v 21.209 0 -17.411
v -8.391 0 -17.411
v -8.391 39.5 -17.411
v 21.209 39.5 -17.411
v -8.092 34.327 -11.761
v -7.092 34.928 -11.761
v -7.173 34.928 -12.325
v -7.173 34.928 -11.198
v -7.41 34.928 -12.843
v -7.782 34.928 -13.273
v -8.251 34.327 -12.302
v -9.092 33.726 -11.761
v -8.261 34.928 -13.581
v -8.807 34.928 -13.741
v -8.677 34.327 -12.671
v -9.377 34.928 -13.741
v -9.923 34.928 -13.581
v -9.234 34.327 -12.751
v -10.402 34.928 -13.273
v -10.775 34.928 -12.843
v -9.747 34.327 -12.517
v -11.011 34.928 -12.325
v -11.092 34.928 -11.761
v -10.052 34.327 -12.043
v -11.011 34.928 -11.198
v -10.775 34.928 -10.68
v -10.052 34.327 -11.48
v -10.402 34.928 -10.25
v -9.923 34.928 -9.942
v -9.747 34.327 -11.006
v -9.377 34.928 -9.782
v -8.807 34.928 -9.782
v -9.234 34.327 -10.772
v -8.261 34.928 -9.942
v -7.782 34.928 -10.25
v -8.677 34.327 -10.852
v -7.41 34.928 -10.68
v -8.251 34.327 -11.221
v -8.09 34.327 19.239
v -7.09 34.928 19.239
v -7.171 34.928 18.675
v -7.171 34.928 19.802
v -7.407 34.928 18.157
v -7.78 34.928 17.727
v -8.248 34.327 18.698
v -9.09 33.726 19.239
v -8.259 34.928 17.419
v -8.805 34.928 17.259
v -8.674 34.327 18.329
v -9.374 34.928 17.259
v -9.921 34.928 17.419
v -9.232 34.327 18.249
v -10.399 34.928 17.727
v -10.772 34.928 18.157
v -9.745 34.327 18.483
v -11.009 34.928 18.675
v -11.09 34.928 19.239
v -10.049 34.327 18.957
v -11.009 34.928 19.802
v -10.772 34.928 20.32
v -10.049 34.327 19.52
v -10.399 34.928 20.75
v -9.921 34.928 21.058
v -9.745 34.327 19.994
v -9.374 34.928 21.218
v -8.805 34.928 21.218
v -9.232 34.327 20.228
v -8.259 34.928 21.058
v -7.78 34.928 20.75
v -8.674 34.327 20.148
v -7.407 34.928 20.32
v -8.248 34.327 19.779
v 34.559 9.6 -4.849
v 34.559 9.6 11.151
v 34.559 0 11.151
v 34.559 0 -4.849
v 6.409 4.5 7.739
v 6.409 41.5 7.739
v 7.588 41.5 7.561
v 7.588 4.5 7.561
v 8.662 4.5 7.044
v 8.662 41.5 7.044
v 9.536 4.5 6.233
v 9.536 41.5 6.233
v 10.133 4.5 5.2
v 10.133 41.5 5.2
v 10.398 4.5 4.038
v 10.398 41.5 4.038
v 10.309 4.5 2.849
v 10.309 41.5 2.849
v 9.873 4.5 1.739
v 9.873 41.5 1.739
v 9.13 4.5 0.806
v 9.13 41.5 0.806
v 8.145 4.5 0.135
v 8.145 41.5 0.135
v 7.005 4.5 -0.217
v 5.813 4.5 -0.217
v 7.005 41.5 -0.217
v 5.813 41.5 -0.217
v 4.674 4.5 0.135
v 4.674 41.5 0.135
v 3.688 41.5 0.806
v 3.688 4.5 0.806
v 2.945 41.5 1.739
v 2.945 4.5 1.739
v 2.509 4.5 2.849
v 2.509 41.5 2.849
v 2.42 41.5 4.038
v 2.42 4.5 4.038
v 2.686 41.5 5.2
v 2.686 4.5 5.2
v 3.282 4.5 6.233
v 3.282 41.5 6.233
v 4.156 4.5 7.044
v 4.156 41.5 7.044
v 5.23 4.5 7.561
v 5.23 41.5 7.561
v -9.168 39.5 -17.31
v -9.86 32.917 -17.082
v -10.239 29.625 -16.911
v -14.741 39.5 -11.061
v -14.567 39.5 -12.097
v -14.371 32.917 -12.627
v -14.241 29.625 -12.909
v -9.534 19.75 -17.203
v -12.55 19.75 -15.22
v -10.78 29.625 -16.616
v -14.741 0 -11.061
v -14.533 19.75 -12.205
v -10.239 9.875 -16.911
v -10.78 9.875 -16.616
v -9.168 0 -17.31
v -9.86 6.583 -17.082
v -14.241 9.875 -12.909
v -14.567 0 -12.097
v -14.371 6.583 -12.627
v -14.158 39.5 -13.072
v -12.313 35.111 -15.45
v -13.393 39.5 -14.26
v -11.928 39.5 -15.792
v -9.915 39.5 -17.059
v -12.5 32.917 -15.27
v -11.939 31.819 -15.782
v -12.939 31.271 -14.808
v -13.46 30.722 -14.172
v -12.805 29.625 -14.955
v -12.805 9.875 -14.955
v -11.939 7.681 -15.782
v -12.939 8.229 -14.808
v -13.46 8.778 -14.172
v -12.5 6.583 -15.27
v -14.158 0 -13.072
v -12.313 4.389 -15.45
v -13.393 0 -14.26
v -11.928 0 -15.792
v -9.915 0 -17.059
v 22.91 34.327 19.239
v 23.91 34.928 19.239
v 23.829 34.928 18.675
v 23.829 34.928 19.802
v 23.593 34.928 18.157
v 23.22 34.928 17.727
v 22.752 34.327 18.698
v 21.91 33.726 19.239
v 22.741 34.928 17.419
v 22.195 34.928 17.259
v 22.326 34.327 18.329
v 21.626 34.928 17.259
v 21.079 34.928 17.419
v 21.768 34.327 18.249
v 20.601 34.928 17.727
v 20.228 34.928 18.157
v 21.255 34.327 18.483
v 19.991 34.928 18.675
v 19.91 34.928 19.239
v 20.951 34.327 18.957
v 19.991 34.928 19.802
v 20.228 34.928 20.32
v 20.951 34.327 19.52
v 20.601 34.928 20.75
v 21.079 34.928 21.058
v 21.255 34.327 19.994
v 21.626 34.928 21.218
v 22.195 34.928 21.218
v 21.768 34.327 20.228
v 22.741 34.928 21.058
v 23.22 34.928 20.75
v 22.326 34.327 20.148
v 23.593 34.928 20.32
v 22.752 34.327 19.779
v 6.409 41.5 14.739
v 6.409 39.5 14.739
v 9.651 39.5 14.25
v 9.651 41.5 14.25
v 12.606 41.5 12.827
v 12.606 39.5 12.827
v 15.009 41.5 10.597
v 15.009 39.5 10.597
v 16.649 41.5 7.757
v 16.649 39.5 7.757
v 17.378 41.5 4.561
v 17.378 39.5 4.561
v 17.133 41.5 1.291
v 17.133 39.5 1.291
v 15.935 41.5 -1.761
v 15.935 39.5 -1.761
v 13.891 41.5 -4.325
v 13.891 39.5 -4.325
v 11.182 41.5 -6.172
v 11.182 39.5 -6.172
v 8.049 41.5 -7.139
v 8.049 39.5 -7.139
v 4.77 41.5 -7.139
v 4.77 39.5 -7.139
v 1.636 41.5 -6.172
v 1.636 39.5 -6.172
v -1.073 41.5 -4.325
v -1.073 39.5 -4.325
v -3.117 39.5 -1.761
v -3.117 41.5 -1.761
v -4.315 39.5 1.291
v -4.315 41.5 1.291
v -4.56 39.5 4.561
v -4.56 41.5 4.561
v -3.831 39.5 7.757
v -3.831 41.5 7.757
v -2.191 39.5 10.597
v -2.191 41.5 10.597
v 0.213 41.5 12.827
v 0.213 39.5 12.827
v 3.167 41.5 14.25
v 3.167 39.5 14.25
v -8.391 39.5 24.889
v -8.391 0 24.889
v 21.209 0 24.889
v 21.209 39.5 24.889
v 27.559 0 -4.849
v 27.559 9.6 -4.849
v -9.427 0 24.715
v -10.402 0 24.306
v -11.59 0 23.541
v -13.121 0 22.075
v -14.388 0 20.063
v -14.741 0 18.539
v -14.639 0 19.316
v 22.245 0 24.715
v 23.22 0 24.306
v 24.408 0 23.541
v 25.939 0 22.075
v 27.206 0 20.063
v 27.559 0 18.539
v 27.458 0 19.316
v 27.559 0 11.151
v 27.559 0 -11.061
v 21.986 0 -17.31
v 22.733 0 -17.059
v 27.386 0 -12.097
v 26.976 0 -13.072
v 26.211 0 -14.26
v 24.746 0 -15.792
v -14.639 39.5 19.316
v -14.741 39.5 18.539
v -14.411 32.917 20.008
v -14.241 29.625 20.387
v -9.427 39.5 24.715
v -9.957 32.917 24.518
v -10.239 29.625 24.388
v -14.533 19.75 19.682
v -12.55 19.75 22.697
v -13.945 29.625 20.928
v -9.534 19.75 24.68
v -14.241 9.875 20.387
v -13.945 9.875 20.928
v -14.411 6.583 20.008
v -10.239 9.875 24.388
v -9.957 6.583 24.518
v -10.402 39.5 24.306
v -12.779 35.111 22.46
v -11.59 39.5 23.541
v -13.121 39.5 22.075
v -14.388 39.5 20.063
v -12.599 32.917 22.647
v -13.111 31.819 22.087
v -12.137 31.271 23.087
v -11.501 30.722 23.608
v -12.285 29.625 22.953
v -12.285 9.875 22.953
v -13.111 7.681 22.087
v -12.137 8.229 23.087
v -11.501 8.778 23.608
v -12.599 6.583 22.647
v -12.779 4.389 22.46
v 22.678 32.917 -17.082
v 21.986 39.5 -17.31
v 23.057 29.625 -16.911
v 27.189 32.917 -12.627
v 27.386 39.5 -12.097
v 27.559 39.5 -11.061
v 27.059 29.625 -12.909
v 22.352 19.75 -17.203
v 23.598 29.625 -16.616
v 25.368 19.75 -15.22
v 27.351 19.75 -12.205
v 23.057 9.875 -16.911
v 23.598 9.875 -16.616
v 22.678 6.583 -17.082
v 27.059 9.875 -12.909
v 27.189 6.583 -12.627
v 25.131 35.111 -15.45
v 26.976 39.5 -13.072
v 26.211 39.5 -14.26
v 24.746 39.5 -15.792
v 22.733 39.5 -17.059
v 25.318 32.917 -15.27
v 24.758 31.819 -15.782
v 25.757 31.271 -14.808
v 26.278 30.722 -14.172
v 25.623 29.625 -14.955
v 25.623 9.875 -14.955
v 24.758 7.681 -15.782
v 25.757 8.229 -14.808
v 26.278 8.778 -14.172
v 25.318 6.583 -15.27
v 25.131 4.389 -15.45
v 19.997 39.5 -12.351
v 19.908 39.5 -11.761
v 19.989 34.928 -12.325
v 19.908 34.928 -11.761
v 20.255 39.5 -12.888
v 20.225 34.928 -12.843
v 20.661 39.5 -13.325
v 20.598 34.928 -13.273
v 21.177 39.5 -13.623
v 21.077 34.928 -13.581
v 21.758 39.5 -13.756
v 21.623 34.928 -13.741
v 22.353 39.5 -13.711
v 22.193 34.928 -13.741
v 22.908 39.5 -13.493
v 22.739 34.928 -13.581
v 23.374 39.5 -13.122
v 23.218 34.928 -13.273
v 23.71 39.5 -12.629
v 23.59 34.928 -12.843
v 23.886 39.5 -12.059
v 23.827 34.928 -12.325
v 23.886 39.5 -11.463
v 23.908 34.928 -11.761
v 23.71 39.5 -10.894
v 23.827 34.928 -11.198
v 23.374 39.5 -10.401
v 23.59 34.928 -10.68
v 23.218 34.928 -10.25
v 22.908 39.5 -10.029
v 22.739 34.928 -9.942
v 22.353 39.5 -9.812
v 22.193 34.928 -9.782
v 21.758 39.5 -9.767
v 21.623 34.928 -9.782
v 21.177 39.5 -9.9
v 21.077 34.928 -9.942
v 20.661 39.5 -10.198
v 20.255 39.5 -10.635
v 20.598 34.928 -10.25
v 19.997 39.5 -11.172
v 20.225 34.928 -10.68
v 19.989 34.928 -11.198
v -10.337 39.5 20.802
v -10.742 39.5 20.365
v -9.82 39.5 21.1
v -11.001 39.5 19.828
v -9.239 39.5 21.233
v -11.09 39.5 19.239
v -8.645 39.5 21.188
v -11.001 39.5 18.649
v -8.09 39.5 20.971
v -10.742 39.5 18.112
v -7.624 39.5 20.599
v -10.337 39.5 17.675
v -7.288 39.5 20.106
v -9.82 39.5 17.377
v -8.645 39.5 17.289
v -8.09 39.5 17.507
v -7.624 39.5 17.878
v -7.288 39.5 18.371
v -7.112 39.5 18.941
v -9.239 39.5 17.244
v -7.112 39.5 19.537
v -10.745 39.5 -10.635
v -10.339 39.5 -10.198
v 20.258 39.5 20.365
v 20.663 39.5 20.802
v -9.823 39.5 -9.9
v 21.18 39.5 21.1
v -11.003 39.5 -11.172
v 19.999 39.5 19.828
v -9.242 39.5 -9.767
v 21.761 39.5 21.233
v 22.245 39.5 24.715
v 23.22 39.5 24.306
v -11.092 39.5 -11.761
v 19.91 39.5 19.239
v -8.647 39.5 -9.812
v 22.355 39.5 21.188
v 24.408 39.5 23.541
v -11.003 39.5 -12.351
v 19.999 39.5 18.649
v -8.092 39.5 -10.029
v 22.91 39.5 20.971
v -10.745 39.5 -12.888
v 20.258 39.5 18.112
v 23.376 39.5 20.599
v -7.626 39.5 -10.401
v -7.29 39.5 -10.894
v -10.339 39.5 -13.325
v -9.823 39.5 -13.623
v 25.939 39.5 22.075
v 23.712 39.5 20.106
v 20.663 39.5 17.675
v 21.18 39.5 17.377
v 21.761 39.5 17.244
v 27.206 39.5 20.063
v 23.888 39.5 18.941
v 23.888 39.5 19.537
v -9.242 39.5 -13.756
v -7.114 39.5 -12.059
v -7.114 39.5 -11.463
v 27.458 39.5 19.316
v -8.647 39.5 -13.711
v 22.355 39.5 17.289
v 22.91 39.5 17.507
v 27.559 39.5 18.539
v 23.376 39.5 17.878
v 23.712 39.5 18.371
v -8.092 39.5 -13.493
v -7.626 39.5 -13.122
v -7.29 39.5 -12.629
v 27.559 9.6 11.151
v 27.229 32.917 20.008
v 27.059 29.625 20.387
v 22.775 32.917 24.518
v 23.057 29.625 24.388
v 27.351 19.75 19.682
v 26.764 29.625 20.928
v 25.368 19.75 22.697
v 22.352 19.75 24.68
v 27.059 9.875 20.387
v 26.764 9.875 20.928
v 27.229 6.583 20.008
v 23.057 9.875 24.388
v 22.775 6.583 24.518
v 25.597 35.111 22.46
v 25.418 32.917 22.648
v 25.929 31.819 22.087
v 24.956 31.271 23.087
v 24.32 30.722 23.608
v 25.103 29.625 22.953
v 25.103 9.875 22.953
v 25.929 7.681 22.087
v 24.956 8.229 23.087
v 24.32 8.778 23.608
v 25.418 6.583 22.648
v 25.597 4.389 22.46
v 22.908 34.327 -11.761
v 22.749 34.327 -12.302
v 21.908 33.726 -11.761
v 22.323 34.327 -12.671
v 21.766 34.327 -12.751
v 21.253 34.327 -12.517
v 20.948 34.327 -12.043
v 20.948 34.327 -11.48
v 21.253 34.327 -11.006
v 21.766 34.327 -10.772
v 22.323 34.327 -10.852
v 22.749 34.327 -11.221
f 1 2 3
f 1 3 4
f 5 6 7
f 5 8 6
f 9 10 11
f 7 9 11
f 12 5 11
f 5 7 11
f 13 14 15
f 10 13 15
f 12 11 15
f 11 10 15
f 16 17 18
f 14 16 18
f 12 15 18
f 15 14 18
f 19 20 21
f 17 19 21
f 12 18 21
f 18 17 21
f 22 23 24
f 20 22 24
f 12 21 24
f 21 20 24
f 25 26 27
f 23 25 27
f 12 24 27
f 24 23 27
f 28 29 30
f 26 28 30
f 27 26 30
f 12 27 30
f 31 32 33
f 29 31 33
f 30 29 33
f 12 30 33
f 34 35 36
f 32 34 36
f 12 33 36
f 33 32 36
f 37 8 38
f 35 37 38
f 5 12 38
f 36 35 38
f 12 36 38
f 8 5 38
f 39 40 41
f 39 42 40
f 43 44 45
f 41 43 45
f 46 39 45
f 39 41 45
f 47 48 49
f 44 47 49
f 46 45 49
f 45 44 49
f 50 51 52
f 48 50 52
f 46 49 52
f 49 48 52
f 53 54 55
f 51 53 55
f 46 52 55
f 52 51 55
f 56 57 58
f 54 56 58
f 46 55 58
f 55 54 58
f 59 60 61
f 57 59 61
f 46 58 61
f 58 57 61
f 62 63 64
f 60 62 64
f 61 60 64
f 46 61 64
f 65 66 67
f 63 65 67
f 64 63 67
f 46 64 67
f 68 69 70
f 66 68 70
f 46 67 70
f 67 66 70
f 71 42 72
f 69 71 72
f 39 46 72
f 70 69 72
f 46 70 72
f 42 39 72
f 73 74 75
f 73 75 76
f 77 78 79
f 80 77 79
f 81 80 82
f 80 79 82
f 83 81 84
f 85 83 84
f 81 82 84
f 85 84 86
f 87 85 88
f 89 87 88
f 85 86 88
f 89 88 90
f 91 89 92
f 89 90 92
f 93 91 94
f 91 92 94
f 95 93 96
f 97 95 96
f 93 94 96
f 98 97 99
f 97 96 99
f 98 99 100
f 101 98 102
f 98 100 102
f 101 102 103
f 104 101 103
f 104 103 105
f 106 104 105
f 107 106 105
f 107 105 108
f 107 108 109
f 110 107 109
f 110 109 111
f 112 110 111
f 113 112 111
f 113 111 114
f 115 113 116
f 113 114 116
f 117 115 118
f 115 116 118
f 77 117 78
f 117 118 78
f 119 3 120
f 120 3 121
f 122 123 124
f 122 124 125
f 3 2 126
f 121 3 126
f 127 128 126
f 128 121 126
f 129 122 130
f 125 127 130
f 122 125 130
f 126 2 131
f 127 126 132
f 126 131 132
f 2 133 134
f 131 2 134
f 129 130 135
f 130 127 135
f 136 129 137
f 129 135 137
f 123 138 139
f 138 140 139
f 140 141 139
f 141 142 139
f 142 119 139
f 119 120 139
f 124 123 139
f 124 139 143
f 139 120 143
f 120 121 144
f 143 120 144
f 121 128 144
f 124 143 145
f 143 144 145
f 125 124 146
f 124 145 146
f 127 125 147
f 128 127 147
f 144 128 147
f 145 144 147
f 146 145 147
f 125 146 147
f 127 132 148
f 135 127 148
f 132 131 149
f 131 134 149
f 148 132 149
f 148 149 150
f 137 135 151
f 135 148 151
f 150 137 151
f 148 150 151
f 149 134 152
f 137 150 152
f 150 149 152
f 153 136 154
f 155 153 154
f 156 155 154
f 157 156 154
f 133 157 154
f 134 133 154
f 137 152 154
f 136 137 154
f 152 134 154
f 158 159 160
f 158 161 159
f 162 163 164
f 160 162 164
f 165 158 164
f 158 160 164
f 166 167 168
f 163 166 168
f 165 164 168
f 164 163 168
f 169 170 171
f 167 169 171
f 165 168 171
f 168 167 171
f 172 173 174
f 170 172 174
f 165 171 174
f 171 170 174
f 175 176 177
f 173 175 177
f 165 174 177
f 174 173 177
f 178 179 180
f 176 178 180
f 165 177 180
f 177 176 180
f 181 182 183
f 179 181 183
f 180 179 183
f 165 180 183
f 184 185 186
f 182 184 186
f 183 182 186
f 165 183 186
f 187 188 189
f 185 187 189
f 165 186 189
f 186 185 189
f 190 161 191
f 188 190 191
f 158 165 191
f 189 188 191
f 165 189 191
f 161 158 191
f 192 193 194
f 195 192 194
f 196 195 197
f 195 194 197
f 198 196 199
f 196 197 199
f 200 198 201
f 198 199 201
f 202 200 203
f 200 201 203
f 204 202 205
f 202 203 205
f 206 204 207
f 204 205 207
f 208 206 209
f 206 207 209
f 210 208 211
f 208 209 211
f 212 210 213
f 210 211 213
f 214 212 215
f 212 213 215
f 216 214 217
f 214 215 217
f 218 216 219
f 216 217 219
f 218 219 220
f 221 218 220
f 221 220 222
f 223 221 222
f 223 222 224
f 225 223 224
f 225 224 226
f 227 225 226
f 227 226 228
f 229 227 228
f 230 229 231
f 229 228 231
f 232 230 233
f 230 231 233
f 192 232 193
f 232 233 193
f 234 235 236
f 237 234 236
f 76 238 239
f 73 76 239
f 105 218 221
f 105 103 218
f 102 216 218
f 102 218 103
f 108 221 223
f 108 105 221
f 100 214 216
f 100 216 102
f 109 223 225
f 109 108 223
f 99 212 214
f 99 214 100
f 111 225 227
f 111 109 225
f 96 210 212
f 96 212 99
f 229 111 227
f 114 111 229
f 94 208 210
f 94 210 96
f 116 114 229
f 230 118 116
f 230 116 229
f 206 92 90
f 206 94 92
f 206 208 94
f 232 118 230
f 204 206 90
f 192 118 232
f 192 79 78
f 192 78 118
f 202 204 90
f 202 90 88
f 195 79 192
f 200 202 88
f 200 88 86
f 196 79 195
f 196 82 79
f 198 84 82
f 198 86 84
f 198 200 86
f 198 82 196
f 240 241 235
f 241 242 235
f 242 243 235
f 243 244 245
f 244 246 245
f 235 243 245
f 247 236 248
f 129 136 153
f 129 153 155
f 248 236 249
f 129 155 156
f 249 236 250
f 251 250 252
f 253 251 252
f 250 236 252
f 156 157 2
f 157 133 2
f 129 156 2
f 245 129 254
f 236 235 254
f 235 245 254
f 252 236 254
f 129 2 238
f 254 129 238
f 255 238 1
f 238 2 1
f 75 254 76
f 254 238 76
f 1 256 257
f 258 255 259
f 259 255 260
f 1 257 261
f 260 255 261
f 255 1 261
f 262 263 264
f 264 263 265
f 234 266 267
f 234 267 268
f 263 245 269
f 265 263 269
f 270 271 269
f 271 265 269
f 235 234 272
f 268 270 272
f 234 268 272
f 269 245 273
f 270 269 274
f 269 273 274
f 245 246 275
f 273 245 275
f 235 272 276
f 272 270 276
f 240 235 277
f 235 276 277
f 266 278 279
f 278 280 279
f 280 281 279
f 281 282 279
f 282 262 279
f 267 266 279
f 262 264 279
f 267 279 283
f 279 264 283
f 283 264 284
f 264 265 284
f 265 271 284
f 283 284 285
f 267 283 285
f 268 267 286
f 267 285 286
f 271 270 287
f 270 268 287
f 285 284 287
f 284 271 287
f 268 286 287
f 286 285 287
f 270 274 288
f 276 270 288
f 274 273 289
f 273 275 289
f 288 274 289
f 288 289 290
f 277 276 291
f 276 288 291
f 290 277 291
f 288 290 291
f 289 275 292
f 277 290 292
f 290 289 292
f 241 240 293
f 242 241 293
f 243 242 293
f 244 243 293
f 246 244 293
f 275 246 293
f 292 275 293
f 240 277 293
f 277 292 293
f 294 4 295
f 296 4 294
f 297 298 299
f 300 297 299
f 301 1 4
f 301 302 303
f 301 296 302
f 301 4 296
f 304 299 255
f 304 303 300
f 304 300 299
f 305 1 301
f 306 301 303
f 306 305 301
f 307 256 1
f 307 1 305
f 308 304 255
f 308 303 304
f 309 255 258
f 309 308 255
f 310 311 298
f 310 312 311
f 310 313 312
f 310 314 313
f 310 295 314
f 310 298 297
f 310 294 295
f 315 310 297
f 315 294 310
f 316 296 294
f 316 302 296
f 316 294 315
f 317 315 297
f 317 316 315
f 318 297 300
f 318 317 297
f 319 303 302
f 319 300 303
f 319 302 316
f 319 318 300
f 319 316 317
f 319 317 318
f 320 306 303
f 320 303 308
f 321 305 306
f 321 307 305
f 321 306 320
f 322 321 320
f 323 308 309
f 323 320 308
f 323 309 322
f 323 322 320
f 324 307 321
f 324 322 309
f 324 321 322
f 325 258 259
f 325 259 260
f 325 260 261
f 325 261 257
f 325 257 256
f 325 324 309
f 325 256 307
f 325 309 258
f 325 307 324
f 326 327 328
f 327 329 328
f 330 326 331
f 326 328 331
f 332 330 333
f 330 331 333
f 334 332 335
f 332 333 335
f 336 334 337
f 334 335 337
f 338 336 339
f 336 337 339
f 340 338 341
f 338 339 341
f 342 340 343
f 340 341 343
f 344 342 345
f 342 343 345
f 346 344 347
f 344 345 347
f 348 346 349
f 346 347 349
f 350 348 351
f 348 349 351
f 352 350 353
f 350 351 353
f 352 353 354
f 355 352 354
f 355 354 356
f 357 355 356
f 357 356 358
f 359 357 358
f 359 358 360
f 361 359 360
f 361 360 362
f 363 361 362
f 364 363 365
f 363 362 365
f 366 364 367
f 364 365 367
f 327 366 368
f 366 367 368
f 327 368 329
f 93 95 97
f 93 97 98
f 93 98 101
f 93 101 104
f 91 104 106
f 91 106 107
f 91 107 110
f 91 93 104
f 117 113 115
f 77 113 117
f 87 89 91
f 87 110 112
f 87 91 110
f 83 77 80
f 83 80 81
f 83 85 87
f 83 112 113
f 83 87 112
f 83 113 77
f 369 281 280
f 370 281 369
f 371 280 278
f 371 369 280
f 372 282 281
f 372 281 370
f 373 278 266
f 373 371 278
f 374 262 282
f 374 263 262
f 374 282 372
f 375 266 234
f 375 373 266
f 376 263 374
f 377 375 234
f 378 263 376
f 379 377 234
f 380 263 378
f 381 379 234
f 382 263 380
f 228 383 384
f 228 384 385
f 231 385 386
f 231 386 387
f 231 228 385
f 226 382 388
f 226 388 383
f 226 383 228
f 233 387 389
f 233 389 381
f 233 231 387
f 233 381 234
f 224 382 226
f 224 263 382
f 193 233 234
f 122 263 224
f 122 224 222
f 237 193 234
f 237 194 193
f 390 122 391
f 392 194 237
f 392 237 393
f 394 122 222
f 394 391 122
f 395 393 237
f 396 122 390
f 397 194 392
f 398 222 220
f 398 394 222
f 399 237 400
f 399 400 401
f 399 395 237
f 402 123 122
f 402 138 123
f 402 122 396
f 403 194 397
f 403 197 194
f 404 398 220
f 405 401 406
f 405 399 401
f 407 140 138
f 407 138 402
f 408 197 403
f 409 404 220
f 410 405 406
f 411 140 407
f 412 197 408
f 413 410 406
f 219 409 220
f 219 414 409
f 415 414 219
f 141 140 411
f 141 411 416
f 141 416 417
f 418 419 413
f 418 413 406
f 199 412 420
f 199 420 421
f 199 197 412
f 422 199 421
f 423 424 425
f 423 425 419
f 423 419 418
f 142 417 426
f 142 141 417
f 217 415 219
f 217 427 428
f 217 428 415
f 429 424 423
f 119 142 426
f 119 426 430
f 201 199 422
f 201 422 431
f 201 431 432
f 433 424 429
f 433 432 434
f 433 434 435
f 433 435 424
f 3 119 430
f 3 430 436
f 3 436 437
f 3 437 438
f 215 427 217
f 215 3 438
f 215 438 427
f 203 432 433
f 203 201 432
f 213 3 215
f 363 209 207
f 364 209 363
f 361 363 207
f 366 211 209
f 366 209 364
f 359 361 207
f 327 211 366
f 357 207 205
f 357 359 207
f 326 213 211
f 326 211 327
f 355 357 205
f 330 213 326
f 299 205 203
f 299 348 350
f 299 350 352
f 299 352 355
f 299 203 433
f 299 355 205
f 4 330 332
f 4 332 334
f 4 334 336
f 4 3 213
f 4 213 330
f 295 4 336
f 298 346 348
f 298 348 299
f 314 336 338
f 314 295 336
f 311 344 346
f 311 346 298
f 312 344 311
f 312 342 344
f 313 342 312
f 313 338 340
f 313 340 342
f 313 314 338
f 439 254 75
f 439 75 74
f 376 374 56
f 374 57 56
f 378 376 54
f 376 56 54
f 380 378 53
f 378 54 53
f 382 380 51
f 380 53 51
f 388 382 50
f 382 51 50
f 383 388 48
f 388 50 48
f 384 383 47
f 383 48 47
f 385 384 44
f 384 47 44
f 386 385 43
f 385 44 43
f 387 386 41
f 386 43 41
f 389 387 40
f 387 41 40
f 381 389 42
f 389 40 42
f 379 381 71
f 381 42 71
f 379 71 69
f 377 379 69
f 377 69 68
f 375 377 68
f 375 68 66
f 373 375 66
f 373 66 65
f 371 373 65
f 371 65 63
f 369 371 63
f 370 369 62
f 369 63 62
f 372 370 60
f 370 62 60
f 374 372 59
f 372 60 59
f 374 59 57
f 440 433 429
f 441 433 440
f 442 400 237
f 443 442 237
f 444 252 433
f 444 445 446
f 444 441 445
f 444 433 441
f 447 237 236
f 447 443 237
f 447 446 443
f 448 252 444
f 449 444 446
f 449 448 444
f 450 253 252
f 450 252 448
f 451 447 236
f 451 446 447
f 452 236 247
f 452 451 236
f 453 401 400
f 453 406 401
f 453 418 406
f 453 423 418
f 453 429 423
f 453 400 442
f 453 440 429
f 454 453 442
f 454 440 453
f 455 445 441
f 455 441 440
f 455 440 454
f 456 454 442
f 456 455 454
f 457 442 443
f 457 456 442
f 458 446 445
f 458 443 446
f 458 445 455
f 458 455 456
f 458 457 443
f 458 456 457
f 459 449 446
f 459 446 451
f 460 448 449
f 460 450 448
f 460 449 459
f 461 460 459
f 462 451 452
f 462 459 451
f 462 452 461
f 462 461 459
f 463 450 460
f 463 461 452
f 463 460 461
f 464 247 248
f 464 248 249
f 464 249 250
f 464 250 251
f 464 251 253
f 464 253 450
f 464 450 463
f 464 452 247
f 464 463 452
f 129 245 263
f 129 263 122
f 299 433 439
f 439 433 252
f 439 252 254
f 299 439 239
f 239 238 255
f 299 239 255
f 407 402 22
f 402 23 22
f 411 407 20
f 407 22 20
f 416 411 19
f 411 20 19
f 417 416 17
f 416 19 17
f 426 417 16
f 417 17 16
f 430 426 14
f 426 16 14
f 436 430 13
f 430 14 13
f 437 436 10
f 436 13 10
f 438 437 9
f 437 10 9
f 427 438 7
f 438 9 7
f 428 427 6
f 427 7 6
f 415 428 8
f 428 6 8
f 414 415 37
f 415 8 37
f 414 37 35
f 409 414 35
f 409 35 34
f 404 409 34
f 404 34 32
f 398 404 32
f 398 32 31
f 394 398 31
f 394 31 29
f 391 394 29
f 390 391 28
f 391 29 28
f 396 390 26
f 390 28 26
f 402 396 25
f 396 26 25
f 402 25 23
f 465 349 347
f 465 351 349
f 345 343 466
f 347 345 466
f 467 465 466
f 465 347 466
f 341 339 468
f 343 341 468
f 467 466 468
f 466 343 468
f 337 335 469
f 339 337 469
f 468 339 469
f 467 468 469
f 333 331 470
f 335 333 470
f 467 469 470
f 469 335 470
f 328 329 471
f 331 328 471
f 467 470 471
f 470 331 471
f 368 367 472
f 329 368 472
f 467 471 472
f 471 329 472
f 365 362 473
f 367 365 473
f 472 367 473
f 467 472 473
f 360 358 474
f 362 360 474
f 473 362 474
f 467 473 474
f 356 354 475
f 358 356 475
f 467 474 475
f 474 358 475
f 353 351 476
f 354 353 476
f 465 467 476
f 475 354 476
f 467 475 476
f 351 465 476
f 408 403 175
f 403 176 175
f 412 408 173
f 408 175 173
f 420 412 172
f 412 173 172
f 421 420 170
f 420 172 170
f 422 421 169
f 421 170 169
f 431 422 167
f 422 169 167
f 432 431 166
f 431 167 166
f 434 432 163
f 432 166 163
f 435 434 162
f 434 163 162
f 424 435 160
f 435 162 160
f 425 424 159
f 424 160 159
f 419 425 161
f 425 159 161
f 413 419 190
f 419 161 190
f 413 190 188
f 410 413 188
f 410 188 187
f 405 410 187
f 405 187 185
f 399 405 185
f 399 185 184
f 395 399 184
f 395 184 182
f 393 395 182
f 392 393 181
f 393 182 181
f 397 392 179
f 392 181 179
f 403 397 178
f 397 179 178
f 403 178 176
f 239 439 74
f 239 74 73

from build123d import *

# Parameters (mm, degrees)
SKETCH1_W                 = 42.3
SKETCH1_H                 = 42.3
BOSS_EXTRUDE1_DEPTH       = 39.5
SKETCH2_R                 = 11
BOSS_EXTRUDE2_DEPTH       = 2
FILLET1_SIZE              = 6.35
F_4_0MM_DOWEL_HOLE1_D     = 4
F_4_0MM_DOWEL_HOLE1_DEPTH = 4.572
F_4_0MM_DOWEL_HOLE1_TIP   = 1.201721238
SKETCH6_R                 = 4
CUT_EXTRUDE1_DEPTH        = 37
SKETCH7_W                 = 16
SKETCH7_H                 = 9.6
BOSS_EXTRUDE3_DEPTH       = 7


with BuildPart() as part:
    # Sketch1 → Boss-Extrude1 (new body)
    with BuildSketch(Plane(origin=(0, 0, 0), x_dir=(1, 0, 0), z_dir=(0, 1, 0))):
        with Locations((6.409090909, -3.738636364)):
            Rectangle(SKETCH1_W, SKETCH1_H)
    extrude(amount=BOSS_EXTRUDE1_DEPTH)

    # Sketch2 → Boss-Extrude2 (add)
    with BuildSketch(Plane(origin=(0, 39.5, 0), x_dir=(1, 0, 0), z_dir=(0, 1, 0))):
        with Locations(Location((6.409090909, -3.738636364, 0), (0, 0, 270))):
            Circle(SKETCH2_R)
    extrude(amount=BOSS_EXTRUDE2_DEPTH)

    # Fillet1
    # a fillet whose section is not a circle: 6.35 mm, written as the material it takes off along each edge
    with BuildSketch(Plane(origin=(-14.740909091, -15.875, -17.411363636), x_dir=(1, 0, 0), z_dir=(0, 1, 0)), Plane(origin=(-14.740909091, -15.875, 24.888636364), x_dir=(0, 0, -1), z_dir=(0, 1, 0))) as fillet1_piece_1:
        with BuildLine():
            Bezier((FILLET1_SIZE, 0), (0, 0), (0, -FILLET1_SIZE), weights=[1, 0.449012806, 1])
            Line((0, -FILLET1_SIZE), (0, 0))
            Line((0, 0), (FILLET1_SIZE, 0))
        make_face()
    extrude(amount=71.25, mode=Mode.SUBTRACT)
    with BuildSketch(Plane(origin=(27.559090909, -15.875, -17.411363636), x_dir=(-1, 0, 0), z_dir=(0, 1, 0)), Plane(origin=(27.559090909, -15.875, 24.888636364), x_dir=(0, 0, -1), z_dir=(0, 1, 0))) as fillet1_piece_2:
        with BuildLine():
            Bezier((FILLET1_SIZE, 0), (0, 0), (0, FILLET1_SIZE), weights=[1, 0.449012806, 1])
            Line((0, FILLET1_SIZE), (0, 0))
            Line((0, 0), (FILLET1_SIZE, 0))
        make_face()
    extrude(amount=71.25, mode=Mode.SUBTRACT)

    # Ø4.0mm Dowel Hole1
    with Locations(Plane(origin=(0, 39.5, 0), x_dir=(1, 0, 0), z_dir=(0, 1, 0))):
        with Locations((-9.092111006, 11.76136359), (21.907888994, 11.76136359), (21.910292824, -19.238636317), (-9.089707176, -19.23863641)):
            Hole(F_4_0MM_DOWEL_HOLE1_D / 2, depth=F_4_0MM_DOWEL_HOLE1_DEPTH)
            with Locations((0, 0, -(F_4_0MM_DOWEL_HOLE1_DEPTH + F_4_0MM_DOWEL_HOLE1_TIP / 2))):  # 118° drill point
                Cone(0, F_4_0MM_DOWEL_HOLE1_D / 2, F_4_0MM_DOWEL_HOLE1_TIP, mode=Mode.SUBTRACT)

    # Sketch6 → Cut-Extrude1 (cut)
    with BuildSketch(Plane(origin=(0, 41.5, 0), x_dir=(1, 0, 0), z_dir=(0, 1, 0))):
        with Locations(Location((6.409090909, -3.738636364, 0), (0, 0, 270))):
            Circle(SKETCH6_R)
    extrude(amount=-CUT_EXTRUDE1_DEPTH, mode=Mode.SUBTRACT)

    # Sketch7 → Boss-Extrude3 (add)
    with BuildSketch(Plane(origin=(27.559090909, 0, 0), x_dir=(0, 0, -1), z_dir=(1, 0, 0))):
        with Locations((-3.15108899, 4.8)):
            Rectangle(SKETCH7_W, SKETCH7_H)
    extrude(amount=BOSS_EXTRUDE3_DEPTH)


solid = part.part
